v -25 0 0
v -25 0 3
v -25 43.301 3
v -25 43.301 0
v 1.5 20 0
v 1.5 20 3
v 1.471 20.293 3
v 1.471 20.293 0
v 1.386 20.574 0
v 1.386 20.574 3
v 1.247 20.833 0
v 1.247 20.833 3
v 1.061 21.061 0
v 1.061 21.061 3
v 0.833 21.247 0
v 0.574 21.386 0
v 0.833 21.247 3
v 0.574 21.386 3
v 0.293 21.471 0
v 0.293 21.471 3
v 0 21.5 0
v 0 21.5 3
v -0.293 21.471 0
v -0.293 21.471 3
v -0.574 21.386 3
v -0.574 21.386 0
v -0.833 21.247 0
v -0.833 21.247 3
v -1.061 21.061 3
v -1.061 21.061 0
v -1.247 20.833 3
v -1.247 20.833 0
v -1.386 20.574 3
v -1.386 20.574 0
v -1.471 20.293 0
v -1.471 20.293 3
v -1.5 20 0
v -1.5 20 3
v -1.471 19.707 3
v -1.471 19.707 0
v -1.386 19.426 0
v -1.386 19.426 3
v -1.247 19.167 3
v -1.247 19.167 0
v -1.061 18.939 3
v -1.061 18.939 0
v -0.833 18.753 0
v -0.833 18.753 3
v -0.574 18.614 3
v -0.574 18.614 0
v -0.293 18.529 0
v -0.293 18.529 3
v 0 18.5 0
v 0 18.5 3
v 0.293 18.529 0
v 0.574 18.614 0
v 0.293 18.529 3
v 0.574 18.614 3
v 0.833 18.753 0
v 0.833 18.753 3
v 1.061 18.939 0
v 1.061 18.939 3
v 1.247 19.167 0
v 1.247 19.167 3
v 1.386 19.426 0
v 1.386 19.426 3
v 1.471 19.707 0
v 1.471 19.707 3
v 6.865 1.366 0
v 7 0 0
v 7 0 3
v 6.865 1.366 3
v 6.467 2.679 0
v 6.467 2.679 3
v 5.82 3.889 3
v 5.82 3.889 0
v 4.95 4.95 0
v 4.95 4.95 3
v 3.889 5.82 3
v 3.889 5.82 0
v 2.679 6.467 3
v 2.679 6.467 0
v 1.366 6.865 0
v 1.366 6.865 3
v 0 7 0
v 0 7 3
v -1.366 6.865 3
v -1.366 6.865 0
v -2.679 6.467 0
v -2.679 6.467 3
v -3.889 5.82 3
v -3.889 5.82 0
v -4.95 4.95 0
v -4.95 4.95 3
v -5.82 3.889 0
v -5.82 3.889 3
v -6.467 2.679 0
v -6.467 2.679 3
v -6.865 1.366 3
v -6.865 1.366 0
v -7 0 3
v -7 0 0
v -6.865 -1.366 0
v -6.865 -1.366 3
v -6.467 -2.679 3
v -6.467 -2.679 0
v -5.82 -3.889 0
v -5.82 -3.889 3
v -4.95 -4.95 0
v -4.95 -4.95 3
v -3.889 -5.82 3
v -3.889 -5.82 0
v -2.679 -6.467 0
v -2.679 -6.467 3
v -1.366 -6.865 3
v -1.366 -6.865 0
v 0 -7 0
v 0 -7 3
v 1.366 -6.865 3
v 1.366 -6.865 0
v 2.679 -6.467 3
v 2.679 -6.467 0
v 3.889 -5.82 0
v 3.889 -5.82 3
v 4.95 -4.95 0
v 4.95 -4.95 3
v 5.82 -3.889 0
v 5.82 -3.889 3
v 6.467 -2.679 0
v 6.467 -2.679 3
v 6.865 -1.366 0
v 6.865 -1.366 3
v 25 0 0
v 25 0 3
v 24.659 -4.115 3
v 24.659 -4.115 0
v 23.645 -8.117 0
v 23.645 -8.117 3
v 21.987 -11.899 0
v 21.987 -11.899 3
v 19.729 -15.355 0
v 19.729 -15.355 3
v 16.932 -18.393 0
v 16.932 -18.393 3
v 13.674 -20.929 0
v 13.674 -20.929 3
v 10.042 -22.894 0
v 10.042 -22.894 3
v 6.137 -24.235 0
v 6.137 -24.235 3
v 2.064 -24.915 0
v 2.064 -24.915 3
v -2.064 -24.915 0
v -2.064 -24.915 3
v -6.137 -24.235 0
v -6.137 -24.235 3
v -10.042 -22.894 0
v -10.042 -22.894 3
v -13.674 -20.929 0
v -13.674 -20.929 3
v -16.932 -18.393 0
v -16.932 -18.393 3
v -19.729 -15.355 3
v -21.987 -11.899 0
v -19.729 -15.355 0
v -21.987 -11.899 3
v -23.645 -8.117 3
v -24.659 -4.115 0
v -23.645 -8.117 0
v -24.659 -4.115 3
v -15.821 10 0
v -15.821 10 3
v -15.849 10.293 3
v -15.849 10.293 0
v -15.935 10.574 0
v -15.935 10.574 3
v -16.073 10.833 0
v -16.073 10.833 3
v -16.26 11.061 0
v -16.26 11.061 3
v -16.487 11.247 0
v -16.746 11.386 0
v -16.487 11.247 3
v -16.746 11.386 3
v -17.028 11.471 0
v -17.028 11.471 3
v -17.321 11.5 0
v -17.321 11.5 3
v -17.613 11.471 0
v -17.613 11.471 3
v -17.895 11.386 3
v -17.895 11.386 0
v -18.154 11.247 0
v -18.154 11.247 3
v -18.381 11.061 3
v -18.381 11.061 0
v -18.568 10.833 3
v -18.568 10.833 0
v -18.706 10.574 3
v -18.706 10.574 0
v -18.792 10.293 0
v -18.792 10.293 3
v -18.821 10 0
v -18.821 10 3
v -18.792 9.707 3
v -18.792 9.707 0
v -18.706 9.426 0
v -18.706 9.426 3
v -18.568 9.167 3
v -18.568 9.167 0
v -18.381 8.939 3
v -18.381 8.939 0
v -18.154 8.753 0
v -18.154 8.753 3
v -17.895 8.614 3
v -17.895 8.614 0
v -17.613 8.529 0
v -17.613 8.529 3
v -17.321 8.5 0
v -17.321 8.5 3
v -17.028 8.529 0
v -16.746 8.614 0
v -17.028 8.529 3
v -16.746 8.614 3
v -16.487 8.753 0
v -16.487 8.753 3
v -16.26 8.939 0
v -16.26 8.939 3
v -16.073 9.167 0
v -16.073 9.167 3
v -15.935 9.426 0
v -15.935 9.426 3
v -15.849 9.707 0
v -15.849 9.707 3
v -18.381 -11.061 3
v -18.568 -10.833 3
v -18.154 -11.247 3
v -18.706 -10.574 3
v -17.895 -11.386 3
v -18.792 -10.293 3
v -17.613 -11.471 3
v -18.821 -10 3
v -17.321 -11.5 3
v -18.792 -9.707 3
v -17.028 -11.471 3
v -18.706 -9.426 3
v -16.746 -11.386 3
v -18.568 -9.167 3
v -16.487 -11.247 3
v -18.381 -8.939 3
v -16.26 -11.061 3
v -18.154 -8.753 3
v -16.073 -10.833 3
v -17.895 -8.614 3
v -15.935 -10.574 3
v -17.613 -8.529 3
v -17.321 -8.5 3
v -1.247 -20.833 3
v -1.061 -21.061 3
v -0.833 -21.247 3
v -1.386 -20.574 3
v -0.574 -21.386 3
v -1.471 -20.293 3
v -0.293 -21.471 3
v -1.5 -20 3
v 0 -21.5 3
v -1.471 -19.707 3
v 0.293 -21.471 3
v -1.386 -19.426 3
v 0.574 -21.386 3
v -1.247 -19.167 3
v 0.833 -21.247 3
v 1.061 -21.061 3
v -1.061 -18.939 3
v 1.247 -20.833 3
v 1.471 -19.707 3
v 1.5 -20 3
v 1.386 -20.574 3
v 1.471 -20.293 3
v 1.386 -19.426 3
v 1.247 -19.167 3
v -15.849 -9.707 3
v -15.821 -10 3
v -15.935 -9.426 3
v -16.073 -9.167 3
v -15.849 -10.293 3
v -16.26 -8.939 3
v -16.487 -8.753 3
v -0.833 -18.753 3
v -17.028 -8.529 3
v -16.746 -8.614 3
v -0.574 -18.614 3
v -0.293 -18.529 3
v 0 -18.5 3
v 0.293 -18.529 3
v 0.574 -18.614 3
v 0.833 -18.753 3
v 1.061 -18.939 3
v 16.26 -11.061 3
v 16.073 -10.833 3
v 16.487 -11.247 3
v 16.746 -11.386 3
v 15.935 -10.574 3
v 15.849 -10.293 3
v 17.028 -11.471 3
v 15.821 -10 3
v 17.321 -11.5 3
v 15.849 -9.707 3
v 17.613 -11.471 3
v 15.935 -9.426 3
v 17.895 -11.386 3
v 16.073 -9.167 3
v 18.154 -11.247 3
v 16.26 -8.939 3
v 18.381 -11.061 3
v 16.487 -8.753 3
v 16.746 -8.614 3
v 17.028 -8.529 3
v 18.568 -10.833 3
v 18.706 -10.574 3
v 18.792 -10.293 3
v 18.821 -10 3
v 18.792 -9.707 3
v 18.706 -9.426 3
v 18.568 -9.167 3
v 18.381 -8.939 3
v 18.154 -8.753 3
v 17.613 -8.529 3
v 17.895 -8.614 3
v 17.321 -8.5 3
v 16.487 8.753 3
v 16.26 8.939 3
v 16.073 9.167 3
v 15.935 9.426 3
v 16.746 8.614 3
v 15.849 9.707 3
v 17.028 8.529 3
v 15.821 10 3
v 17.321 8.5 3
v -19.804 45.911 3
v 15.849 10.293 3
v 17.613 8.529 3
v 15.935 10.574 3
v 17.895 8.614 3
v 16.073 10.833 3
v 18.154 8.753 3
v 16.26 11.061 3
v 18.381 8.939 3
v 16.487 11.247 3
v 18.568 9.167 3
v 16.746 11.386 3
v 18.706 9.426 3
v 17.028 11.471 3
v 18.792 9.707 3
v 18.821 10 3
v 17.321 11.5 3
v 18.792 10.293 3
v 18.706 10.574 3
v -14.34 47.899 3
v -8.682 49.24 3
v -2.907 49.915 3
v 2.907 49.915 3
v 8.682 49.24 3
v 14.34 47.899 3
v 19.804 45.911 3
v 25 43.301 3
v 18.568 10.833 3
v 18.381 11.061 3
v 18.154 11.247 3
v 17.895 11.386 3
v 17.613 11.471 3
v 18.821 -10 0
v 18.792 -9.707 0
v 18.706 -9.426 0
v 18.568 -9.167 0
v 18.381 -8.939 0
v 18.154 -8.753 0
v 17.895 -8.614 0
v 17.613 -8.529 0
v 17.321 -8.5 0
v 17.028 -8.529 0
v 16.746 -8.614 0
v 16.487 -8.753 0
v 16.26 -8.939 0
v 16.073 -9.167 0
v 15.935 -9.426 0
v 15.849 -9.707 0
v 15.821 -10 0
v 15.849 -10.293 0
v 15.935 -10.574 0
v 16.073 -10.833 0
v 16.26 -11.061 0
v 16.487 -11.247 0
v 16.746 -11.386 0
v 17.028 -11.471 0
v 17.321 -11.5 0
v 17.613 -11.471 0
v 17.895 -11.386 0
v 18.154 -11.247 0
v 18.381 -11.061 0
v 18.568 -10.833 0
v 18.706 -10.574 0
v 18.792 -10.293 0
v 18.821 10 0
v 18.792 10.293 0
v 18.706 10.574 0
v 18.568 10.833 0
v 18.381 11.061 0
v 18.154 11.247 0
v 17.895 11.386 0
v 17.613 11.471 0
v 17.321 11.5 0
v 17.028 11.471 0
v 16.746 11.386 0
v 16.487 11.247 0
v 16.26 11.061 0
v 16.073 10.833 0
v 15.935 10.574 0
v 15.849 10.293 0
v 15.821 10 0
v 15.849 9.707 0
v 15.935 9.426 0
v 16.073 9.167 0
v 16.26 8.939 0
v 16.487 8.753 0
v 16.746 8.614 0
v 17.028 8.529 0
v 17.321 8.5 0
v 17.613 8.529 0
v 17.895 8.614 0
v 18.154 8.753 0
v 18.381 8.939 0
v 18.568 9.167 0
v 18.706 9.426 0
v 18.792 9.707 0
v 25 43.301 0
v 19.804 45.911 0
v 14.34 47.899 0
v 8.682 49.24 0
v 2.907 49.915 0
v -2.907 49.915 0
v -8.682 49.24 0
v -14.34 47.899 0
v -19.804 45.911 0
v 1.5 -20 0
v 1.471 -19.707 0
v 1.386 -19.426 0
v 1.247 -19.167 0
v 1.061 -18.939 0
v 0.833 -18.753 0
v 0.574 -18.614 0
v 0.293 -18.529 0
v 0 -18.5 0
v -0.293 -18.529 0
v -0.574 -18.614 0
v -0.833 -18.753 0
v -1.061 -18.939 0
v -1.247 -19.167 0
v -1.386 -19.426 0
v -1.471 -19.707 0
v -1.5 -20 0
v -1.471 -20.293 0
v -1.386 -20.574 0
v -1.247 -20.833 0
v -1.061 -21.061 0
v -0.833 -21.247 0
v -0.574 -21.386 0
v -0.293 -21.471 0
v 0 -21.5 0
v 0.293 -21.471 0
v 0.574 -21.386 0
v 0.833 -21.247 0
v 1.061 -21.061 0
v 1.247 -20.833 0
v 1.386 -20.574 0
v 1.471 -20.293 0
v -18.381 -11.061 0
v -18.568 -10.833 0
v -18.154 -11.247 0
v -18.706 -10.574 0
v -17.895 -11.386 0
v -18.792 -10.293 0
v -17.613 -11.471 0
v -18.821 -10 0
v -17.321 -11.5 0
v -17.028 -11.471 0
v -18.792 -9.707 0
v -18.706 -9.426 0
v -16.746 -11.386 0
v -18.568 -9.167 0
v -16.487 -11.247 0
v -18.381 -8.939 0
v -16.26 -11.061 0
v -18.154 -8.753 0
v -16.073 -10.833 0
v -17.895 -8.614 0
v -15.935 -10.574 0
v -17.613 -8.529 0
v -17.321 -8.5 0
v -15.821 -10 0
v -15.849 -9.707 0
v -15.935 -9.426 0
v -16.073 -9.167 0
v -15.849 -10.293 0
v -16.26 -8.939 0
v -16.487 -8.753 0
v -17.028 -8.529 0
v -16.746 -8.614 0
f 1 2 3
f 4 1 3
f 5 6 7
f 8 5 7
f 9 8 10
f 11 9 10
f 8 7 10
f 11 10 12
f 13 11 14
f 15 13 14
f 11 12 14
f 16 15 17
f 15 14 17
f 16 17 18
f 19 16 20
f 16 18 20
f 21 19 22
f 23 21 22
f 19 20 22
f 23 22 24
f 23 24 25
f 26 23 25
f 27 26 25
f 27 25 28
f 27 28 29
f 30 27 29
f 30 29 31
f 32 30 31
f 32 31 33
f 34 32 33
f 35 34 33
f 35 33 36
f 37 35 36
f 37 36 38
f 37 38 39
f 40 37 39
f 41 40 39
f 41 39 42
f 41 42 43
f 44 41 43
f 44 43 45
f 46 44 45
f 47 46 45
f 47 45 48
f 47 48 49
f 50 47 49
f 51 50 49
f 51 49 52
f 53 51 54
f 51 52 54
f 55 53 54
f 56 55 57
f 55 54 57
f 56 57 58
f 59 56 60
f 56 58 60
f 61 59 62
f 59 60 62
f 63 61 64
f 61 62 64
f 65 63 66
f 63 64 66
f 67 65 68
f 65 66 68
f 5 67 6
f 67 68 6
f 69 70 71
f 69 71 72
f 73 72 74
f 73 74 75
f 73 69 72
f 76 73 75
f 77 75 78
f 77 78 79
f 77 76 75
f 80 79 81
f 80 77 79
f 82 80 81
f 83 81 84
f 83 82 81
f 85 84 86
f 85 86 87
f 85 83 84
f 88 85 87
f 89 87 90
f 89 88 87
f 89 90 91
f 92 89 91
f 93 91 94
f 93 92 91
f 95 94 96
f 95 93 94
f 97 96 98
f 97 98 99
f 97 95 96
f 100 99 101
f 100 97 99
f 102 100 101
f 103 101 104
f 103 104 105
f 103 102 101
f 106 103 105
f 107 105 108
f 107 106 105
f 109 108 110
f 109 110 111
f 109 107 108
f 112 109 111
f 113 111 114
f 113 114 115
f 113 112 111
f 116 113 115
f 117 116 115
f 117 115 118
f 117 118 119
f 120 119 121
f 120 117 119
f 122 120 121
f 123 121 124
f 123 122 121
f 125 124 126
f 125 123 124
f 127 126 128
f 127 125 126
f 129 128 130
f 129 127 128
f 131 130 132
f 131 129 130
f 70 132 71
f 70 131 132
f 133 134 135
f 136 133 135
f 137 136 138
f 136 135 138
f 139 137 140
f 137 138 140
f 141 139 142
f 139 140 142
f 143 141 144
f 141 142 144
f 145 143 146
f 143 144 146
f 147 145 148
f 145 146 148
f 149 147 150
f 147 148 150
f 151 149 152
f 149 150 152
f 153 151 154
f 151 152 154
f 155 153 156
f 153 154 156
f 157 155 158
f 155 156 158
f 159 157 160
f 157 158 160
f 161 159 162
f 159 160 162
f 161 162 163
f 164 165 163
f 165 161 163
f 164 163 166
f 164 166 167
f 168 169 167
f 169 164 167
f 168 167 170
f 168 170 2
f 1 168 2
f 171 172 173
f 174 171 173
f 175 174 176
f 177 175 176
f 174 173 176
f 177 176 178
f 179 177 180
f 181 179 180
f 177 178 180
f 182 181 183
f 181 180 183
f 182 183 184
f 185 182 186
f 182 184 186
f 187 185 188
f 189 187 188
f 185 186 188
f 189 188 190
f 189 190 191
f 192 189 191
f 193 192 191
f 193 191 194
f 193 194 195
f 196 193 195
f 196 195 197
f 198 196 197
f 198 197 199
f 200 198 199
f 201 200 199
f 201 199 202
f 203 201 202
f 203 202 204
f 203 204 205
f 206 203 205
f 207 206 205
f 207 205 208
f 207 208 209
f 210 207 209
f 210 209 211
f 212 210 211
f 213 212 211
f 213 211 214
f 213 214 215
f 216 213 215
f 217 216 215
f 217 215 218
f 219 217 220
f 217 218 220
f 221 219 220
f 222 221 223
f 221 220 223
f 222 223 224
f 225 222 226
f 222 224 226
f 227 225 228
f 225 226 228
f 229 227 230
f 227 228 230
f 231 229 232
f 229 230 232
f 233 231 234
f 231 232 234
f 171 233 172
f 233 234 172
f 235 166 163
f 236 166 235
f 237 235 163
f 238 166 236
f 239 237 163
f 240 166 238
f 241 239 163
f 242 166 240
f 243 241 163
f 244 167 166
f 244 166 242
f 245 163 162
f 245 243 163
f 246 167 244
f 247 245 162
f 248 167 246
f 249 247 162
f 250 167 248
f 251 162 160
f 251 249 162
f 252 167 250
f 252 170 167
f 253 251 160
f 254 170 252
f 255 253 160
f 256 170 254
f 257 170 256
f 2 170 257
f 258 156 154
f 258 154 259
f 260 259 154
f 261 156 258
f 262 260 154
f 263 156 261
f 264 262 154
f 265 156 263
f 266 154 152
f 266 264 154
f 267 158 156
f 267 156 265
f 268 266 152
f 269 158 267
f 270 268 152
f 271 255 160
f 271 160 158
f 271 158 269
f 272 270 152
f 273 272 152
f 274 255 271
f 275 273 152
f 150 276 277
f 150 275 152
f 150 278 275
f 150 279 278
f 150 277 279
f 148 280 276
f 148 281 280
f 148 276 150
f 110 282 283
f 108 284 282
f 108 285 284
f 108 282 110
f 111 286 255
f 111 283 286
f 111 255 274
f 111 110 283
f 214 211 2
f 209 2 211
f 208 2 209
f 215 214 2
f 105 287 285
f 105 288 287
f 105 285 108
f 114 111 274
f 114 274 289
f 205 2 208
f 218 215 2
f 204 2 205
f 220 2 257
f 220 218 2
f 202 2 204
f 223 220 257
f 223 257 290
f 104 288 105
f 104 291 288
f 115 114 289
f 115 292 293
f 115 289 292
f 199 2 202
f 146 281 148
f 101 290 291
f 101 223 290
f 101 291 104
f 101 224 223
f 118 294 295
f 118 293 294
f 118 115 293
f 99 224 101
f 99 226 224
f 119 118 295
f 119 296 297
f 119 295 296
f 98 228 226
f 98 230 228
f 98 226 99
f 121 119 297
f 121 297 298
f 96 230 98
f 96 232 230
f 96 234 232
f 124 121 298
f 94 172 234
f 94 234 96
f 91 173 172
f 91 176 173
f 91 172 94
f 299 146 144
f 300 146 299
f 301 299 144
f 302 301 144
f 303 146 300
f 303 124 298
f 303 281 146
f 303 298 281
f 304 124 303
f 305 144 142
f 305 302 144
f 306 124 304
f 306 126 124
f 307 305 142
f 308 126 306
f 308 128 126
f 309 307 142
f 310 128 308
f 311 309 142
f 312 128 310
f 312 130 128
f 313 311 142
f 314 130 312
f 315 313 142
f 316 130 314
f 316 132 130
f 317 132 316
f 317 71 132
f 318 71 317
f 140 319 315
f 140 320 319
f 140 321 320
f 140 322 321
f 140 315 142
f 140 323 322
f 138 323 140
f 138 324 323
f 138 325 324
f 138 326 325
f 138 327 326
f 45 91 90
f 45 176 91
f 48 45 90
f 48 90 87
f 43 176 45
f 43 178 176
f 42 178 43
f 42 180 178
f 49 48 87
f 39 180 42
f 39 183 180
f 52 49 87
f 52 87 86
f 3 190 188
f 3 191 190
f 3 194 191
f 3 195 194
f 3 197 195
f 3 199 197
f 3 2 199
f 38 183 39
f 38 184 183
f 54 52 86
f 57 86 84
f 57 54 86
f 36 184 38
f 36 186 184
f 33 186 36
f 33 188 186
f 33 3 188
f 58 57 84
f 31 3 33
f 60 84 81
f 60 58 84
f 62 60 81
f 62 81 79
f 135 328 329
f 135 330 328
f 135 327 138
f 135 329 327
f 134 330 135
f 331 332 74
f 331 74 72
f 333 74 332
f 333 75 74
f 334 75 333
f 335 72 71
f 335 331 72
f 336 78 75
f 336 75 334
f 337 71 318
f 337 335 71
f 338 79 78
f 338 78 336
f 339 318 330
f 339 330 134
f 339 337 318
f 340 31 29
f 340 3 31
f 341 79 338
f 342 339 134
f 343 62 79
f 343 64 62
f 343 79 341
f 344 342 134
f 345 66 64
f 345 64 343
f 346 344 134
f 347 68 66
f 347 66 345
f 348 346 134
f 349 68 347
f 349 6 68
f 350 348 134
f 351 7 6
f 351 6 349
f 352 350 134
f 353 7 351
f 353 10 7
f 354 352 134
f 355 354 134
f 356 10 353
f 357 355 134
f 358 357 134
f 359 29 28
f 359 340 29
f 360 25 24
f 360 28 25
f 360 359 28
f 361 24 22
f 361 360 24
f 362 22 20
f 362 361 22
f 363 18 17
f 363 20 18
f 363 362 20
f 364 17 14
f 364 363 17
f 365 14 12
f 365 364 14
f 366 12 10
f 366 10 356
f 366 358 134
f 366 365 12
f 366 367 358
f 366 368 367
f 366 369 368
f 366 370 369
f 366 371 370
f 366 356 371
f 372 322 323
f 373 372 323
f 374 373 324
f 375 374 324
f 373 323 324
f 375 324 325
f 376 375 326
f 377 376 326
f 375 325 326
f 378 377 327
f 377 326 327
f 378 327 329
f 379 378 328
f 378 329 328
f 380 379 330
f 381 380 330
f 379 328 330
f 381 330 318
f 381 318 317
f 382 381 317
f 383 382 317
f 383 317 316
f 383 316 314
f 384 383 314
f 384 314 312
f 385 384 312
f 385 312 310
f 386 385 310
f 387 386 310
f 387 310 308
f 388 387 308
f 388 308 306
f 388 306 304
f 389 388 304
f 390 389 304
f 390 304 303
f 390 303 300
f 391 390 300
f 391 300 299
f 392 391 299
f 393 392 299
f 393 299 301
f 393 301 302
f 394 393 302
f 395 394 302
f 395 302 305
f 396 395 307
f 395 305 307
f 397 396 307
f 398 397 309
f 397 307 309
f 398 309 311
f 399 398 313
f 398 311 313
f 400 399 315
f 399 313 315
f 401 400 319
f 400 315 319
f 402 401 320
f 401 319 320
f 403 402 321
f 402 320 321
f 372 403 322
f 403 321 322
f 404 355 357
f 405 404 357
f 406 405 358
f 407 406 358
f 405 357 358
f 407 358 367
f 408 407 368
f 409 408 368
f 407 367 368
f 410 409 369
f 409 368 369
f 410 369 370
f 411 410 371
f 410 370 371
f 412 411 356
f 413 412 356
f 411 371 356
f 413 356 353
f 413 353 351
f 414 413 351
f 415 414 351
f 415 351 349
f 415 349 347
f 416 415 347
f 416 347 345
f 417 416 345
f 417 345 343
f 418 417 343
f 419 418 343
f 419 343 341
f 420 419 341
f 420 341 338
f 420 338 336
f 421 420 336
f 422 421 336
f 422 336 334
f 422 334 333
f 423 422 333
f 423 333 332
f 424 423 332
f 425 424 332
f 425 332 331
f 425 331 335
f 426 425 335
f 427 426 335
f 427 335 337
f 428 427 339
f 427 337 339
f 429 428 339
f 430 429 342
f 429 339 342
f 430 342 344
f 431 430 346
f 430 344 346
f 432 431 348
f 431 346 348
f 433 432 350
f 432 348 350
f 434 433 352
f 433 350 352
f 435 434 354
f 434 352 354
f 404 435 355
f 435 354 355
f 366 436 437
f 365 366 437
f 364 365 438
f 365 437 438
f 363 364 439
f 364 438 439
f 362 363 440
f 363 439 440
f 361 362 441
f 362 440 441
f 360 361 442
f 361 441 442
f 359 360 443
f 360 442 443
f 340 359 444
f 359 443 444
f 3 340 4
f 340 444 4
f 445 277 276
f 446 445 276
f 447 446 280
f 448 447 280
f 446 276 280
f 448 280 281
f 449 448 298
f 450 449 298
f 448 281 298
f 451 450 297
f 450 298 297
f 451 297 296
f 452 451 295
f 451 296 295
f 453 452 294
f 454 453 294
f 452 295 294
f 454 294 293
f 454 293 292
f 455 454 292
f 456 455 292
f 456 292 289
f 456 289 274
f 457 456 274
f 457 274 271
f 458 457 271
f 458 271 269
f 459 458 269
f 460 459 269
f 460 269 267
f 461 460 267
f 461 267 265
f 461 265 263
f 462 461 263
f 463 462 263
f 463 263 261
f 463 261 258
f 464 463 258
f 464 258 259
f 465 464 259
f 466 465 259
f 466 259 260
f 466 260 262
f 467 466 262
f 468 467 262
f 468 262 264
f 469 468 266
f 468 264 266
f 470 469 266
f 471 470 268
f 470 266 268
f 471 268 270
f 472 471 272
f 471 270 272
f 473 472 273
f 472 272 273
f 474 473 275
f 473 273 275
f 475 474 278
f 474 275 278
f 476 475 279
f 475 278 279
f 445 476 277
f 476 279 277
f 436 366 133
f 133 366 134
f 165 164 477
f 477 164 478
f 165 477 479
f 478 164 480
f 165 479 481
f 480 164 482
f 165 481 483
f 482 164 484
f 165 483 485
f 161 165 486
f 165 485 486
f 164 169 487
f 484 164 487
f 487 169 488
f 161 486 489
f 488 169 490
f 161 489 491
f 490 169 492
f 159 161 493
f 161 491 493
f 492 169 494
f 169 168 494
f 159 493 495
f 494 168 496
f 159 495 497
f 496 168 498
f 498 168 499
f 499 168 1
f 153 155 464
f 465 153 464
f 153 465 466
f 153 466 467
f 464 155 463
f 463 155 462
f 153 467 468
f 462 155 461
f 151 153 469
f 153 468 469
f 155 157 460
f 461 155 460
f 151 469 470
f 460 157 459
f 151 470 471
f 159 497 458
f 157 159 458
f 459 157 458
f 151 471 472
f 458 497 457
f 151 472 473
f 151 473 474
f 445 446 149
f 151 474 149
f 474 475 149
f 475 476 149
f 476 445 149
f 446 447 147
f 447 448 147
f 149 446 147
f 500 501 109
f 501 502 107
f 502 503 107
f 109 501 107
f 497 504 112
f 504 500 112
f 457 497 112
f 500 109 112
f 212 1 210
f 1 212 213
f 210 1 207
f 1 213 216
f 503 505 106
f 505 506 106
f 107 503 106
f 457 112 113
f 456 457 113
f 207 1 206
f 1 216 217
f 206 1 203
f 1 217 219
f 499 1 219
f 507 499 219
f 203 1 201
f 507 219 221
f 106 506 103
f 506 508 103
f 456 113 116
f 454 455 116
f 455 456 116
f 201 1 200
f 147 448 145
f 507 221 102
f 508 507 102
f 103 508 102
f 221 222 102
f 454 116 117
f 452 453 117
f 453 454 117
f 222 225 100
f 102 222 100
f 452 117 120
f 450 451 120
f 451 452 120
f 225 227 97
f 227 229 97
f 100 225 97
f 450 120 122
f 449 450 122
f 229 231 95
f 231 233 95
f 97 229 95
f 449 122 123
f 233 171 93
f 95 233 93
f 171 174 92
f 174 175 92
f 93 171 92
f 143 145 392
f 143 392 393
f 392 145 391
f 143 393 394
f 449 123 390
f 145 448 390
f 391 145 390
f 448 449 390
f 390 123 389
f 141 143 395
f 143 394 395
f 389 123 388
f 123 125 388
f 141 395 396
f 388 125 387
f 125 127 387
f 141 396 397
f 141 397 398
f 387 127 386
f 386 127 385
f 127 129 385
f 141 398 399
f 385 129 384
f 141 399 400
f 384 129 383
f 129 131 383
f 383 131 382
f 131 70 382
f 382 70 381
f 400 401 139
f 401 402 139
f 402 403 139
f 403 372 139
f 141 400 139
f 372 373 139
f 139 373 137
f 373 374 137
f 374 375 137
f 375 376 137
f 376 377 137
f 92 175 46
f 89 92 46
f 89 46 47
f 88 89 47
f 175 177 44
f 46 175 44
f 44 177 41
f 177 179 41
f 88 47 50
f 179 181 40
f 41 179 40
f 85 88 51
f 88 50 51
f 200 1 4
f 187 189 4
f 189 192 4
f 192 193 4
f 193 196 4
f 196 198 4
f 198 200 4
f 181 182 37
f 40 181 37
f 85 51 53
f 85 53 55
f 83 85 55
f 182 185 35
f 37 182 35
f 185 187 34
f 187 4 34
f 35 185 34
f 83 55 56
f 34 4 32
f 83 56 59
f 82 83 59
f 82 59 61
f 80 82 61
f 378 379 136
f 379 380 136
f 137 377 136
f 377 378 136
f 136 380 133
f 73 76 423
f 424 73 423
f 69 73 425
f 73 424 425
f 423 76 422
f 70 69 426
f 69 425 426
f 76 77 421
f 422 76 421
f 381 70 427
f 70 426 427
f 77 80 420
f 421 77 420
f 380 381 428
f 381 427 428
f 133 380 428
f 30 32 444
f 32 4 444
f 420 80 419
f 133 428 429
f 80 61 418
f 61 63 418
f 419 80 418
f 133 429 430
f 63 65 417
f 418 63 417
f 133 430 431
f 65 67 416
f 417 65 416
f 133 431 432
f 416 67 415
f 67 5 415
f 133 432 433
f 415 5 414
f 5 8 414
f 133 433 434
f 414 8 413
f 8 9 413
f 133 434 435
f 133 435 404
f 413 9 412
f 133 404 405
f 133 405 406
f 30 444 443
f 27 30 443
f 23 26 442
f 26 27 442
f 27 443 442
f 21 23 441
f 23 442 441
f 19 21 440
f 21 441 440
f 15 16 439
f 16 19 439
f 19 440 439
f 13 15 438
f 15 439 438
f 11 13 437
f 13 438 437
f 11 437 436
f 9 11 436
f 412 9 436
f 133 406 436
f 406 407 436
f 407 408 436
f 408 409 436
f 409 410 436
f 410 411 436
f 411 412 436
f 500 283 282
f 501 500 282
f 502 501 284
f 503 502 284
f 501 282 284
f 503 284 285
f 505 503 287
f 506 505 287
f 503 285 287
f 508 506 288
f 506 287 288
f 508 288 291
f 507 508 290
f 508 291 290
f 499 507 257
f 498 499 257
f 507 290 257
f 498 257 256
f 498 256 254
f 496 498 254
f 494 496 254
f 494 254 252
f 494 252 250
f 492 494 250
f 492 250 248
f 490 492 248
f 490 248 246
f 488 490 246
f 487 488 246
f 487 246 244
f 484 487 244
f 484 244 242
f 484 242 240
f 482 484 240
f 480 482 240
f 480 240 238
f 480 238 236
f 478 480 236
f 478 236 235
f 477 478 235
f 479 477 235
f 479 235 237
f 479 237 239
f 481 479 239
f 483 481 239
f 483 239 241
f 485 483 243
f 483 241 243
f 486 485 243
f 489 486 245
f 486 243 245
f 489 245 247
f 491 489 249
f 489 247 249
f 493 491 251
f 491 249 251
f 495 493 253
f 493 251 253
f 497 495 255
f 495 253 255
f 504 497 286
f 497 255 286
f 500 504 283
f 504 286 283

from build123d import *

# Parameters (mm, degrees)
ESQUISSE1_R             = 50
ESQUISSE1_R_2           = 7
BOSS_EXTRU_1_DEPTH      = 3
ESQUISSE2_R             = 1.5
ENL_V_MAT_EXTRU_1_DEPTH = 71.774289117


with BuildPart() as part:
    # Esquisse1 → Boss.-Extru.1 (new body)
    with BuildSketch(Plane.XY):
        Circle(ESQUISSE1_R)
        Circle(ESQUISSE1_R_2, mode=Mode.SUBTRACT)
    extrude(amount=BOSS_EXTRU_1_DEPTH)

    # Esquisse2 → Enlèv. mat.-Extru.1 (cut, through all)
    with BuildSketch(Plane.XY.offset(3)):
        with BuildLine():
            Line((25, 43.301270189), (25, 0))
            ThreePointArc((25, 0), (0, -25), (-25, 0))
            Line((-25, 0), (-25, 43.301270189))
            ThreePointArc((-25, 43.301270189), (0, -50), (25, 43.301270189))
        make_face()
        with Locations((0, 20)):
            Circle(ESQUISSE2_R)
        with Locations((17.320508076, 10)):
            Circle(ESQUISSE2_R)
        with Locations((17.320508076, -10)):
            Circle(ESQUISSE2_R)
        with Locations((0, -20)):
            Circle(ESQUISSE2_R)
        with Locations((-17.320508076, -10)):
            Circle(ESQUISSE2_R)
        with Locations((-17.320508076, 10)):
            Circle(ESQUISSE2_R)
    extrude(amount=-ENL_V_MAT_EXTRU_1_DEPTH, mode=Mode.SUBTRACT)


solid = part.part
